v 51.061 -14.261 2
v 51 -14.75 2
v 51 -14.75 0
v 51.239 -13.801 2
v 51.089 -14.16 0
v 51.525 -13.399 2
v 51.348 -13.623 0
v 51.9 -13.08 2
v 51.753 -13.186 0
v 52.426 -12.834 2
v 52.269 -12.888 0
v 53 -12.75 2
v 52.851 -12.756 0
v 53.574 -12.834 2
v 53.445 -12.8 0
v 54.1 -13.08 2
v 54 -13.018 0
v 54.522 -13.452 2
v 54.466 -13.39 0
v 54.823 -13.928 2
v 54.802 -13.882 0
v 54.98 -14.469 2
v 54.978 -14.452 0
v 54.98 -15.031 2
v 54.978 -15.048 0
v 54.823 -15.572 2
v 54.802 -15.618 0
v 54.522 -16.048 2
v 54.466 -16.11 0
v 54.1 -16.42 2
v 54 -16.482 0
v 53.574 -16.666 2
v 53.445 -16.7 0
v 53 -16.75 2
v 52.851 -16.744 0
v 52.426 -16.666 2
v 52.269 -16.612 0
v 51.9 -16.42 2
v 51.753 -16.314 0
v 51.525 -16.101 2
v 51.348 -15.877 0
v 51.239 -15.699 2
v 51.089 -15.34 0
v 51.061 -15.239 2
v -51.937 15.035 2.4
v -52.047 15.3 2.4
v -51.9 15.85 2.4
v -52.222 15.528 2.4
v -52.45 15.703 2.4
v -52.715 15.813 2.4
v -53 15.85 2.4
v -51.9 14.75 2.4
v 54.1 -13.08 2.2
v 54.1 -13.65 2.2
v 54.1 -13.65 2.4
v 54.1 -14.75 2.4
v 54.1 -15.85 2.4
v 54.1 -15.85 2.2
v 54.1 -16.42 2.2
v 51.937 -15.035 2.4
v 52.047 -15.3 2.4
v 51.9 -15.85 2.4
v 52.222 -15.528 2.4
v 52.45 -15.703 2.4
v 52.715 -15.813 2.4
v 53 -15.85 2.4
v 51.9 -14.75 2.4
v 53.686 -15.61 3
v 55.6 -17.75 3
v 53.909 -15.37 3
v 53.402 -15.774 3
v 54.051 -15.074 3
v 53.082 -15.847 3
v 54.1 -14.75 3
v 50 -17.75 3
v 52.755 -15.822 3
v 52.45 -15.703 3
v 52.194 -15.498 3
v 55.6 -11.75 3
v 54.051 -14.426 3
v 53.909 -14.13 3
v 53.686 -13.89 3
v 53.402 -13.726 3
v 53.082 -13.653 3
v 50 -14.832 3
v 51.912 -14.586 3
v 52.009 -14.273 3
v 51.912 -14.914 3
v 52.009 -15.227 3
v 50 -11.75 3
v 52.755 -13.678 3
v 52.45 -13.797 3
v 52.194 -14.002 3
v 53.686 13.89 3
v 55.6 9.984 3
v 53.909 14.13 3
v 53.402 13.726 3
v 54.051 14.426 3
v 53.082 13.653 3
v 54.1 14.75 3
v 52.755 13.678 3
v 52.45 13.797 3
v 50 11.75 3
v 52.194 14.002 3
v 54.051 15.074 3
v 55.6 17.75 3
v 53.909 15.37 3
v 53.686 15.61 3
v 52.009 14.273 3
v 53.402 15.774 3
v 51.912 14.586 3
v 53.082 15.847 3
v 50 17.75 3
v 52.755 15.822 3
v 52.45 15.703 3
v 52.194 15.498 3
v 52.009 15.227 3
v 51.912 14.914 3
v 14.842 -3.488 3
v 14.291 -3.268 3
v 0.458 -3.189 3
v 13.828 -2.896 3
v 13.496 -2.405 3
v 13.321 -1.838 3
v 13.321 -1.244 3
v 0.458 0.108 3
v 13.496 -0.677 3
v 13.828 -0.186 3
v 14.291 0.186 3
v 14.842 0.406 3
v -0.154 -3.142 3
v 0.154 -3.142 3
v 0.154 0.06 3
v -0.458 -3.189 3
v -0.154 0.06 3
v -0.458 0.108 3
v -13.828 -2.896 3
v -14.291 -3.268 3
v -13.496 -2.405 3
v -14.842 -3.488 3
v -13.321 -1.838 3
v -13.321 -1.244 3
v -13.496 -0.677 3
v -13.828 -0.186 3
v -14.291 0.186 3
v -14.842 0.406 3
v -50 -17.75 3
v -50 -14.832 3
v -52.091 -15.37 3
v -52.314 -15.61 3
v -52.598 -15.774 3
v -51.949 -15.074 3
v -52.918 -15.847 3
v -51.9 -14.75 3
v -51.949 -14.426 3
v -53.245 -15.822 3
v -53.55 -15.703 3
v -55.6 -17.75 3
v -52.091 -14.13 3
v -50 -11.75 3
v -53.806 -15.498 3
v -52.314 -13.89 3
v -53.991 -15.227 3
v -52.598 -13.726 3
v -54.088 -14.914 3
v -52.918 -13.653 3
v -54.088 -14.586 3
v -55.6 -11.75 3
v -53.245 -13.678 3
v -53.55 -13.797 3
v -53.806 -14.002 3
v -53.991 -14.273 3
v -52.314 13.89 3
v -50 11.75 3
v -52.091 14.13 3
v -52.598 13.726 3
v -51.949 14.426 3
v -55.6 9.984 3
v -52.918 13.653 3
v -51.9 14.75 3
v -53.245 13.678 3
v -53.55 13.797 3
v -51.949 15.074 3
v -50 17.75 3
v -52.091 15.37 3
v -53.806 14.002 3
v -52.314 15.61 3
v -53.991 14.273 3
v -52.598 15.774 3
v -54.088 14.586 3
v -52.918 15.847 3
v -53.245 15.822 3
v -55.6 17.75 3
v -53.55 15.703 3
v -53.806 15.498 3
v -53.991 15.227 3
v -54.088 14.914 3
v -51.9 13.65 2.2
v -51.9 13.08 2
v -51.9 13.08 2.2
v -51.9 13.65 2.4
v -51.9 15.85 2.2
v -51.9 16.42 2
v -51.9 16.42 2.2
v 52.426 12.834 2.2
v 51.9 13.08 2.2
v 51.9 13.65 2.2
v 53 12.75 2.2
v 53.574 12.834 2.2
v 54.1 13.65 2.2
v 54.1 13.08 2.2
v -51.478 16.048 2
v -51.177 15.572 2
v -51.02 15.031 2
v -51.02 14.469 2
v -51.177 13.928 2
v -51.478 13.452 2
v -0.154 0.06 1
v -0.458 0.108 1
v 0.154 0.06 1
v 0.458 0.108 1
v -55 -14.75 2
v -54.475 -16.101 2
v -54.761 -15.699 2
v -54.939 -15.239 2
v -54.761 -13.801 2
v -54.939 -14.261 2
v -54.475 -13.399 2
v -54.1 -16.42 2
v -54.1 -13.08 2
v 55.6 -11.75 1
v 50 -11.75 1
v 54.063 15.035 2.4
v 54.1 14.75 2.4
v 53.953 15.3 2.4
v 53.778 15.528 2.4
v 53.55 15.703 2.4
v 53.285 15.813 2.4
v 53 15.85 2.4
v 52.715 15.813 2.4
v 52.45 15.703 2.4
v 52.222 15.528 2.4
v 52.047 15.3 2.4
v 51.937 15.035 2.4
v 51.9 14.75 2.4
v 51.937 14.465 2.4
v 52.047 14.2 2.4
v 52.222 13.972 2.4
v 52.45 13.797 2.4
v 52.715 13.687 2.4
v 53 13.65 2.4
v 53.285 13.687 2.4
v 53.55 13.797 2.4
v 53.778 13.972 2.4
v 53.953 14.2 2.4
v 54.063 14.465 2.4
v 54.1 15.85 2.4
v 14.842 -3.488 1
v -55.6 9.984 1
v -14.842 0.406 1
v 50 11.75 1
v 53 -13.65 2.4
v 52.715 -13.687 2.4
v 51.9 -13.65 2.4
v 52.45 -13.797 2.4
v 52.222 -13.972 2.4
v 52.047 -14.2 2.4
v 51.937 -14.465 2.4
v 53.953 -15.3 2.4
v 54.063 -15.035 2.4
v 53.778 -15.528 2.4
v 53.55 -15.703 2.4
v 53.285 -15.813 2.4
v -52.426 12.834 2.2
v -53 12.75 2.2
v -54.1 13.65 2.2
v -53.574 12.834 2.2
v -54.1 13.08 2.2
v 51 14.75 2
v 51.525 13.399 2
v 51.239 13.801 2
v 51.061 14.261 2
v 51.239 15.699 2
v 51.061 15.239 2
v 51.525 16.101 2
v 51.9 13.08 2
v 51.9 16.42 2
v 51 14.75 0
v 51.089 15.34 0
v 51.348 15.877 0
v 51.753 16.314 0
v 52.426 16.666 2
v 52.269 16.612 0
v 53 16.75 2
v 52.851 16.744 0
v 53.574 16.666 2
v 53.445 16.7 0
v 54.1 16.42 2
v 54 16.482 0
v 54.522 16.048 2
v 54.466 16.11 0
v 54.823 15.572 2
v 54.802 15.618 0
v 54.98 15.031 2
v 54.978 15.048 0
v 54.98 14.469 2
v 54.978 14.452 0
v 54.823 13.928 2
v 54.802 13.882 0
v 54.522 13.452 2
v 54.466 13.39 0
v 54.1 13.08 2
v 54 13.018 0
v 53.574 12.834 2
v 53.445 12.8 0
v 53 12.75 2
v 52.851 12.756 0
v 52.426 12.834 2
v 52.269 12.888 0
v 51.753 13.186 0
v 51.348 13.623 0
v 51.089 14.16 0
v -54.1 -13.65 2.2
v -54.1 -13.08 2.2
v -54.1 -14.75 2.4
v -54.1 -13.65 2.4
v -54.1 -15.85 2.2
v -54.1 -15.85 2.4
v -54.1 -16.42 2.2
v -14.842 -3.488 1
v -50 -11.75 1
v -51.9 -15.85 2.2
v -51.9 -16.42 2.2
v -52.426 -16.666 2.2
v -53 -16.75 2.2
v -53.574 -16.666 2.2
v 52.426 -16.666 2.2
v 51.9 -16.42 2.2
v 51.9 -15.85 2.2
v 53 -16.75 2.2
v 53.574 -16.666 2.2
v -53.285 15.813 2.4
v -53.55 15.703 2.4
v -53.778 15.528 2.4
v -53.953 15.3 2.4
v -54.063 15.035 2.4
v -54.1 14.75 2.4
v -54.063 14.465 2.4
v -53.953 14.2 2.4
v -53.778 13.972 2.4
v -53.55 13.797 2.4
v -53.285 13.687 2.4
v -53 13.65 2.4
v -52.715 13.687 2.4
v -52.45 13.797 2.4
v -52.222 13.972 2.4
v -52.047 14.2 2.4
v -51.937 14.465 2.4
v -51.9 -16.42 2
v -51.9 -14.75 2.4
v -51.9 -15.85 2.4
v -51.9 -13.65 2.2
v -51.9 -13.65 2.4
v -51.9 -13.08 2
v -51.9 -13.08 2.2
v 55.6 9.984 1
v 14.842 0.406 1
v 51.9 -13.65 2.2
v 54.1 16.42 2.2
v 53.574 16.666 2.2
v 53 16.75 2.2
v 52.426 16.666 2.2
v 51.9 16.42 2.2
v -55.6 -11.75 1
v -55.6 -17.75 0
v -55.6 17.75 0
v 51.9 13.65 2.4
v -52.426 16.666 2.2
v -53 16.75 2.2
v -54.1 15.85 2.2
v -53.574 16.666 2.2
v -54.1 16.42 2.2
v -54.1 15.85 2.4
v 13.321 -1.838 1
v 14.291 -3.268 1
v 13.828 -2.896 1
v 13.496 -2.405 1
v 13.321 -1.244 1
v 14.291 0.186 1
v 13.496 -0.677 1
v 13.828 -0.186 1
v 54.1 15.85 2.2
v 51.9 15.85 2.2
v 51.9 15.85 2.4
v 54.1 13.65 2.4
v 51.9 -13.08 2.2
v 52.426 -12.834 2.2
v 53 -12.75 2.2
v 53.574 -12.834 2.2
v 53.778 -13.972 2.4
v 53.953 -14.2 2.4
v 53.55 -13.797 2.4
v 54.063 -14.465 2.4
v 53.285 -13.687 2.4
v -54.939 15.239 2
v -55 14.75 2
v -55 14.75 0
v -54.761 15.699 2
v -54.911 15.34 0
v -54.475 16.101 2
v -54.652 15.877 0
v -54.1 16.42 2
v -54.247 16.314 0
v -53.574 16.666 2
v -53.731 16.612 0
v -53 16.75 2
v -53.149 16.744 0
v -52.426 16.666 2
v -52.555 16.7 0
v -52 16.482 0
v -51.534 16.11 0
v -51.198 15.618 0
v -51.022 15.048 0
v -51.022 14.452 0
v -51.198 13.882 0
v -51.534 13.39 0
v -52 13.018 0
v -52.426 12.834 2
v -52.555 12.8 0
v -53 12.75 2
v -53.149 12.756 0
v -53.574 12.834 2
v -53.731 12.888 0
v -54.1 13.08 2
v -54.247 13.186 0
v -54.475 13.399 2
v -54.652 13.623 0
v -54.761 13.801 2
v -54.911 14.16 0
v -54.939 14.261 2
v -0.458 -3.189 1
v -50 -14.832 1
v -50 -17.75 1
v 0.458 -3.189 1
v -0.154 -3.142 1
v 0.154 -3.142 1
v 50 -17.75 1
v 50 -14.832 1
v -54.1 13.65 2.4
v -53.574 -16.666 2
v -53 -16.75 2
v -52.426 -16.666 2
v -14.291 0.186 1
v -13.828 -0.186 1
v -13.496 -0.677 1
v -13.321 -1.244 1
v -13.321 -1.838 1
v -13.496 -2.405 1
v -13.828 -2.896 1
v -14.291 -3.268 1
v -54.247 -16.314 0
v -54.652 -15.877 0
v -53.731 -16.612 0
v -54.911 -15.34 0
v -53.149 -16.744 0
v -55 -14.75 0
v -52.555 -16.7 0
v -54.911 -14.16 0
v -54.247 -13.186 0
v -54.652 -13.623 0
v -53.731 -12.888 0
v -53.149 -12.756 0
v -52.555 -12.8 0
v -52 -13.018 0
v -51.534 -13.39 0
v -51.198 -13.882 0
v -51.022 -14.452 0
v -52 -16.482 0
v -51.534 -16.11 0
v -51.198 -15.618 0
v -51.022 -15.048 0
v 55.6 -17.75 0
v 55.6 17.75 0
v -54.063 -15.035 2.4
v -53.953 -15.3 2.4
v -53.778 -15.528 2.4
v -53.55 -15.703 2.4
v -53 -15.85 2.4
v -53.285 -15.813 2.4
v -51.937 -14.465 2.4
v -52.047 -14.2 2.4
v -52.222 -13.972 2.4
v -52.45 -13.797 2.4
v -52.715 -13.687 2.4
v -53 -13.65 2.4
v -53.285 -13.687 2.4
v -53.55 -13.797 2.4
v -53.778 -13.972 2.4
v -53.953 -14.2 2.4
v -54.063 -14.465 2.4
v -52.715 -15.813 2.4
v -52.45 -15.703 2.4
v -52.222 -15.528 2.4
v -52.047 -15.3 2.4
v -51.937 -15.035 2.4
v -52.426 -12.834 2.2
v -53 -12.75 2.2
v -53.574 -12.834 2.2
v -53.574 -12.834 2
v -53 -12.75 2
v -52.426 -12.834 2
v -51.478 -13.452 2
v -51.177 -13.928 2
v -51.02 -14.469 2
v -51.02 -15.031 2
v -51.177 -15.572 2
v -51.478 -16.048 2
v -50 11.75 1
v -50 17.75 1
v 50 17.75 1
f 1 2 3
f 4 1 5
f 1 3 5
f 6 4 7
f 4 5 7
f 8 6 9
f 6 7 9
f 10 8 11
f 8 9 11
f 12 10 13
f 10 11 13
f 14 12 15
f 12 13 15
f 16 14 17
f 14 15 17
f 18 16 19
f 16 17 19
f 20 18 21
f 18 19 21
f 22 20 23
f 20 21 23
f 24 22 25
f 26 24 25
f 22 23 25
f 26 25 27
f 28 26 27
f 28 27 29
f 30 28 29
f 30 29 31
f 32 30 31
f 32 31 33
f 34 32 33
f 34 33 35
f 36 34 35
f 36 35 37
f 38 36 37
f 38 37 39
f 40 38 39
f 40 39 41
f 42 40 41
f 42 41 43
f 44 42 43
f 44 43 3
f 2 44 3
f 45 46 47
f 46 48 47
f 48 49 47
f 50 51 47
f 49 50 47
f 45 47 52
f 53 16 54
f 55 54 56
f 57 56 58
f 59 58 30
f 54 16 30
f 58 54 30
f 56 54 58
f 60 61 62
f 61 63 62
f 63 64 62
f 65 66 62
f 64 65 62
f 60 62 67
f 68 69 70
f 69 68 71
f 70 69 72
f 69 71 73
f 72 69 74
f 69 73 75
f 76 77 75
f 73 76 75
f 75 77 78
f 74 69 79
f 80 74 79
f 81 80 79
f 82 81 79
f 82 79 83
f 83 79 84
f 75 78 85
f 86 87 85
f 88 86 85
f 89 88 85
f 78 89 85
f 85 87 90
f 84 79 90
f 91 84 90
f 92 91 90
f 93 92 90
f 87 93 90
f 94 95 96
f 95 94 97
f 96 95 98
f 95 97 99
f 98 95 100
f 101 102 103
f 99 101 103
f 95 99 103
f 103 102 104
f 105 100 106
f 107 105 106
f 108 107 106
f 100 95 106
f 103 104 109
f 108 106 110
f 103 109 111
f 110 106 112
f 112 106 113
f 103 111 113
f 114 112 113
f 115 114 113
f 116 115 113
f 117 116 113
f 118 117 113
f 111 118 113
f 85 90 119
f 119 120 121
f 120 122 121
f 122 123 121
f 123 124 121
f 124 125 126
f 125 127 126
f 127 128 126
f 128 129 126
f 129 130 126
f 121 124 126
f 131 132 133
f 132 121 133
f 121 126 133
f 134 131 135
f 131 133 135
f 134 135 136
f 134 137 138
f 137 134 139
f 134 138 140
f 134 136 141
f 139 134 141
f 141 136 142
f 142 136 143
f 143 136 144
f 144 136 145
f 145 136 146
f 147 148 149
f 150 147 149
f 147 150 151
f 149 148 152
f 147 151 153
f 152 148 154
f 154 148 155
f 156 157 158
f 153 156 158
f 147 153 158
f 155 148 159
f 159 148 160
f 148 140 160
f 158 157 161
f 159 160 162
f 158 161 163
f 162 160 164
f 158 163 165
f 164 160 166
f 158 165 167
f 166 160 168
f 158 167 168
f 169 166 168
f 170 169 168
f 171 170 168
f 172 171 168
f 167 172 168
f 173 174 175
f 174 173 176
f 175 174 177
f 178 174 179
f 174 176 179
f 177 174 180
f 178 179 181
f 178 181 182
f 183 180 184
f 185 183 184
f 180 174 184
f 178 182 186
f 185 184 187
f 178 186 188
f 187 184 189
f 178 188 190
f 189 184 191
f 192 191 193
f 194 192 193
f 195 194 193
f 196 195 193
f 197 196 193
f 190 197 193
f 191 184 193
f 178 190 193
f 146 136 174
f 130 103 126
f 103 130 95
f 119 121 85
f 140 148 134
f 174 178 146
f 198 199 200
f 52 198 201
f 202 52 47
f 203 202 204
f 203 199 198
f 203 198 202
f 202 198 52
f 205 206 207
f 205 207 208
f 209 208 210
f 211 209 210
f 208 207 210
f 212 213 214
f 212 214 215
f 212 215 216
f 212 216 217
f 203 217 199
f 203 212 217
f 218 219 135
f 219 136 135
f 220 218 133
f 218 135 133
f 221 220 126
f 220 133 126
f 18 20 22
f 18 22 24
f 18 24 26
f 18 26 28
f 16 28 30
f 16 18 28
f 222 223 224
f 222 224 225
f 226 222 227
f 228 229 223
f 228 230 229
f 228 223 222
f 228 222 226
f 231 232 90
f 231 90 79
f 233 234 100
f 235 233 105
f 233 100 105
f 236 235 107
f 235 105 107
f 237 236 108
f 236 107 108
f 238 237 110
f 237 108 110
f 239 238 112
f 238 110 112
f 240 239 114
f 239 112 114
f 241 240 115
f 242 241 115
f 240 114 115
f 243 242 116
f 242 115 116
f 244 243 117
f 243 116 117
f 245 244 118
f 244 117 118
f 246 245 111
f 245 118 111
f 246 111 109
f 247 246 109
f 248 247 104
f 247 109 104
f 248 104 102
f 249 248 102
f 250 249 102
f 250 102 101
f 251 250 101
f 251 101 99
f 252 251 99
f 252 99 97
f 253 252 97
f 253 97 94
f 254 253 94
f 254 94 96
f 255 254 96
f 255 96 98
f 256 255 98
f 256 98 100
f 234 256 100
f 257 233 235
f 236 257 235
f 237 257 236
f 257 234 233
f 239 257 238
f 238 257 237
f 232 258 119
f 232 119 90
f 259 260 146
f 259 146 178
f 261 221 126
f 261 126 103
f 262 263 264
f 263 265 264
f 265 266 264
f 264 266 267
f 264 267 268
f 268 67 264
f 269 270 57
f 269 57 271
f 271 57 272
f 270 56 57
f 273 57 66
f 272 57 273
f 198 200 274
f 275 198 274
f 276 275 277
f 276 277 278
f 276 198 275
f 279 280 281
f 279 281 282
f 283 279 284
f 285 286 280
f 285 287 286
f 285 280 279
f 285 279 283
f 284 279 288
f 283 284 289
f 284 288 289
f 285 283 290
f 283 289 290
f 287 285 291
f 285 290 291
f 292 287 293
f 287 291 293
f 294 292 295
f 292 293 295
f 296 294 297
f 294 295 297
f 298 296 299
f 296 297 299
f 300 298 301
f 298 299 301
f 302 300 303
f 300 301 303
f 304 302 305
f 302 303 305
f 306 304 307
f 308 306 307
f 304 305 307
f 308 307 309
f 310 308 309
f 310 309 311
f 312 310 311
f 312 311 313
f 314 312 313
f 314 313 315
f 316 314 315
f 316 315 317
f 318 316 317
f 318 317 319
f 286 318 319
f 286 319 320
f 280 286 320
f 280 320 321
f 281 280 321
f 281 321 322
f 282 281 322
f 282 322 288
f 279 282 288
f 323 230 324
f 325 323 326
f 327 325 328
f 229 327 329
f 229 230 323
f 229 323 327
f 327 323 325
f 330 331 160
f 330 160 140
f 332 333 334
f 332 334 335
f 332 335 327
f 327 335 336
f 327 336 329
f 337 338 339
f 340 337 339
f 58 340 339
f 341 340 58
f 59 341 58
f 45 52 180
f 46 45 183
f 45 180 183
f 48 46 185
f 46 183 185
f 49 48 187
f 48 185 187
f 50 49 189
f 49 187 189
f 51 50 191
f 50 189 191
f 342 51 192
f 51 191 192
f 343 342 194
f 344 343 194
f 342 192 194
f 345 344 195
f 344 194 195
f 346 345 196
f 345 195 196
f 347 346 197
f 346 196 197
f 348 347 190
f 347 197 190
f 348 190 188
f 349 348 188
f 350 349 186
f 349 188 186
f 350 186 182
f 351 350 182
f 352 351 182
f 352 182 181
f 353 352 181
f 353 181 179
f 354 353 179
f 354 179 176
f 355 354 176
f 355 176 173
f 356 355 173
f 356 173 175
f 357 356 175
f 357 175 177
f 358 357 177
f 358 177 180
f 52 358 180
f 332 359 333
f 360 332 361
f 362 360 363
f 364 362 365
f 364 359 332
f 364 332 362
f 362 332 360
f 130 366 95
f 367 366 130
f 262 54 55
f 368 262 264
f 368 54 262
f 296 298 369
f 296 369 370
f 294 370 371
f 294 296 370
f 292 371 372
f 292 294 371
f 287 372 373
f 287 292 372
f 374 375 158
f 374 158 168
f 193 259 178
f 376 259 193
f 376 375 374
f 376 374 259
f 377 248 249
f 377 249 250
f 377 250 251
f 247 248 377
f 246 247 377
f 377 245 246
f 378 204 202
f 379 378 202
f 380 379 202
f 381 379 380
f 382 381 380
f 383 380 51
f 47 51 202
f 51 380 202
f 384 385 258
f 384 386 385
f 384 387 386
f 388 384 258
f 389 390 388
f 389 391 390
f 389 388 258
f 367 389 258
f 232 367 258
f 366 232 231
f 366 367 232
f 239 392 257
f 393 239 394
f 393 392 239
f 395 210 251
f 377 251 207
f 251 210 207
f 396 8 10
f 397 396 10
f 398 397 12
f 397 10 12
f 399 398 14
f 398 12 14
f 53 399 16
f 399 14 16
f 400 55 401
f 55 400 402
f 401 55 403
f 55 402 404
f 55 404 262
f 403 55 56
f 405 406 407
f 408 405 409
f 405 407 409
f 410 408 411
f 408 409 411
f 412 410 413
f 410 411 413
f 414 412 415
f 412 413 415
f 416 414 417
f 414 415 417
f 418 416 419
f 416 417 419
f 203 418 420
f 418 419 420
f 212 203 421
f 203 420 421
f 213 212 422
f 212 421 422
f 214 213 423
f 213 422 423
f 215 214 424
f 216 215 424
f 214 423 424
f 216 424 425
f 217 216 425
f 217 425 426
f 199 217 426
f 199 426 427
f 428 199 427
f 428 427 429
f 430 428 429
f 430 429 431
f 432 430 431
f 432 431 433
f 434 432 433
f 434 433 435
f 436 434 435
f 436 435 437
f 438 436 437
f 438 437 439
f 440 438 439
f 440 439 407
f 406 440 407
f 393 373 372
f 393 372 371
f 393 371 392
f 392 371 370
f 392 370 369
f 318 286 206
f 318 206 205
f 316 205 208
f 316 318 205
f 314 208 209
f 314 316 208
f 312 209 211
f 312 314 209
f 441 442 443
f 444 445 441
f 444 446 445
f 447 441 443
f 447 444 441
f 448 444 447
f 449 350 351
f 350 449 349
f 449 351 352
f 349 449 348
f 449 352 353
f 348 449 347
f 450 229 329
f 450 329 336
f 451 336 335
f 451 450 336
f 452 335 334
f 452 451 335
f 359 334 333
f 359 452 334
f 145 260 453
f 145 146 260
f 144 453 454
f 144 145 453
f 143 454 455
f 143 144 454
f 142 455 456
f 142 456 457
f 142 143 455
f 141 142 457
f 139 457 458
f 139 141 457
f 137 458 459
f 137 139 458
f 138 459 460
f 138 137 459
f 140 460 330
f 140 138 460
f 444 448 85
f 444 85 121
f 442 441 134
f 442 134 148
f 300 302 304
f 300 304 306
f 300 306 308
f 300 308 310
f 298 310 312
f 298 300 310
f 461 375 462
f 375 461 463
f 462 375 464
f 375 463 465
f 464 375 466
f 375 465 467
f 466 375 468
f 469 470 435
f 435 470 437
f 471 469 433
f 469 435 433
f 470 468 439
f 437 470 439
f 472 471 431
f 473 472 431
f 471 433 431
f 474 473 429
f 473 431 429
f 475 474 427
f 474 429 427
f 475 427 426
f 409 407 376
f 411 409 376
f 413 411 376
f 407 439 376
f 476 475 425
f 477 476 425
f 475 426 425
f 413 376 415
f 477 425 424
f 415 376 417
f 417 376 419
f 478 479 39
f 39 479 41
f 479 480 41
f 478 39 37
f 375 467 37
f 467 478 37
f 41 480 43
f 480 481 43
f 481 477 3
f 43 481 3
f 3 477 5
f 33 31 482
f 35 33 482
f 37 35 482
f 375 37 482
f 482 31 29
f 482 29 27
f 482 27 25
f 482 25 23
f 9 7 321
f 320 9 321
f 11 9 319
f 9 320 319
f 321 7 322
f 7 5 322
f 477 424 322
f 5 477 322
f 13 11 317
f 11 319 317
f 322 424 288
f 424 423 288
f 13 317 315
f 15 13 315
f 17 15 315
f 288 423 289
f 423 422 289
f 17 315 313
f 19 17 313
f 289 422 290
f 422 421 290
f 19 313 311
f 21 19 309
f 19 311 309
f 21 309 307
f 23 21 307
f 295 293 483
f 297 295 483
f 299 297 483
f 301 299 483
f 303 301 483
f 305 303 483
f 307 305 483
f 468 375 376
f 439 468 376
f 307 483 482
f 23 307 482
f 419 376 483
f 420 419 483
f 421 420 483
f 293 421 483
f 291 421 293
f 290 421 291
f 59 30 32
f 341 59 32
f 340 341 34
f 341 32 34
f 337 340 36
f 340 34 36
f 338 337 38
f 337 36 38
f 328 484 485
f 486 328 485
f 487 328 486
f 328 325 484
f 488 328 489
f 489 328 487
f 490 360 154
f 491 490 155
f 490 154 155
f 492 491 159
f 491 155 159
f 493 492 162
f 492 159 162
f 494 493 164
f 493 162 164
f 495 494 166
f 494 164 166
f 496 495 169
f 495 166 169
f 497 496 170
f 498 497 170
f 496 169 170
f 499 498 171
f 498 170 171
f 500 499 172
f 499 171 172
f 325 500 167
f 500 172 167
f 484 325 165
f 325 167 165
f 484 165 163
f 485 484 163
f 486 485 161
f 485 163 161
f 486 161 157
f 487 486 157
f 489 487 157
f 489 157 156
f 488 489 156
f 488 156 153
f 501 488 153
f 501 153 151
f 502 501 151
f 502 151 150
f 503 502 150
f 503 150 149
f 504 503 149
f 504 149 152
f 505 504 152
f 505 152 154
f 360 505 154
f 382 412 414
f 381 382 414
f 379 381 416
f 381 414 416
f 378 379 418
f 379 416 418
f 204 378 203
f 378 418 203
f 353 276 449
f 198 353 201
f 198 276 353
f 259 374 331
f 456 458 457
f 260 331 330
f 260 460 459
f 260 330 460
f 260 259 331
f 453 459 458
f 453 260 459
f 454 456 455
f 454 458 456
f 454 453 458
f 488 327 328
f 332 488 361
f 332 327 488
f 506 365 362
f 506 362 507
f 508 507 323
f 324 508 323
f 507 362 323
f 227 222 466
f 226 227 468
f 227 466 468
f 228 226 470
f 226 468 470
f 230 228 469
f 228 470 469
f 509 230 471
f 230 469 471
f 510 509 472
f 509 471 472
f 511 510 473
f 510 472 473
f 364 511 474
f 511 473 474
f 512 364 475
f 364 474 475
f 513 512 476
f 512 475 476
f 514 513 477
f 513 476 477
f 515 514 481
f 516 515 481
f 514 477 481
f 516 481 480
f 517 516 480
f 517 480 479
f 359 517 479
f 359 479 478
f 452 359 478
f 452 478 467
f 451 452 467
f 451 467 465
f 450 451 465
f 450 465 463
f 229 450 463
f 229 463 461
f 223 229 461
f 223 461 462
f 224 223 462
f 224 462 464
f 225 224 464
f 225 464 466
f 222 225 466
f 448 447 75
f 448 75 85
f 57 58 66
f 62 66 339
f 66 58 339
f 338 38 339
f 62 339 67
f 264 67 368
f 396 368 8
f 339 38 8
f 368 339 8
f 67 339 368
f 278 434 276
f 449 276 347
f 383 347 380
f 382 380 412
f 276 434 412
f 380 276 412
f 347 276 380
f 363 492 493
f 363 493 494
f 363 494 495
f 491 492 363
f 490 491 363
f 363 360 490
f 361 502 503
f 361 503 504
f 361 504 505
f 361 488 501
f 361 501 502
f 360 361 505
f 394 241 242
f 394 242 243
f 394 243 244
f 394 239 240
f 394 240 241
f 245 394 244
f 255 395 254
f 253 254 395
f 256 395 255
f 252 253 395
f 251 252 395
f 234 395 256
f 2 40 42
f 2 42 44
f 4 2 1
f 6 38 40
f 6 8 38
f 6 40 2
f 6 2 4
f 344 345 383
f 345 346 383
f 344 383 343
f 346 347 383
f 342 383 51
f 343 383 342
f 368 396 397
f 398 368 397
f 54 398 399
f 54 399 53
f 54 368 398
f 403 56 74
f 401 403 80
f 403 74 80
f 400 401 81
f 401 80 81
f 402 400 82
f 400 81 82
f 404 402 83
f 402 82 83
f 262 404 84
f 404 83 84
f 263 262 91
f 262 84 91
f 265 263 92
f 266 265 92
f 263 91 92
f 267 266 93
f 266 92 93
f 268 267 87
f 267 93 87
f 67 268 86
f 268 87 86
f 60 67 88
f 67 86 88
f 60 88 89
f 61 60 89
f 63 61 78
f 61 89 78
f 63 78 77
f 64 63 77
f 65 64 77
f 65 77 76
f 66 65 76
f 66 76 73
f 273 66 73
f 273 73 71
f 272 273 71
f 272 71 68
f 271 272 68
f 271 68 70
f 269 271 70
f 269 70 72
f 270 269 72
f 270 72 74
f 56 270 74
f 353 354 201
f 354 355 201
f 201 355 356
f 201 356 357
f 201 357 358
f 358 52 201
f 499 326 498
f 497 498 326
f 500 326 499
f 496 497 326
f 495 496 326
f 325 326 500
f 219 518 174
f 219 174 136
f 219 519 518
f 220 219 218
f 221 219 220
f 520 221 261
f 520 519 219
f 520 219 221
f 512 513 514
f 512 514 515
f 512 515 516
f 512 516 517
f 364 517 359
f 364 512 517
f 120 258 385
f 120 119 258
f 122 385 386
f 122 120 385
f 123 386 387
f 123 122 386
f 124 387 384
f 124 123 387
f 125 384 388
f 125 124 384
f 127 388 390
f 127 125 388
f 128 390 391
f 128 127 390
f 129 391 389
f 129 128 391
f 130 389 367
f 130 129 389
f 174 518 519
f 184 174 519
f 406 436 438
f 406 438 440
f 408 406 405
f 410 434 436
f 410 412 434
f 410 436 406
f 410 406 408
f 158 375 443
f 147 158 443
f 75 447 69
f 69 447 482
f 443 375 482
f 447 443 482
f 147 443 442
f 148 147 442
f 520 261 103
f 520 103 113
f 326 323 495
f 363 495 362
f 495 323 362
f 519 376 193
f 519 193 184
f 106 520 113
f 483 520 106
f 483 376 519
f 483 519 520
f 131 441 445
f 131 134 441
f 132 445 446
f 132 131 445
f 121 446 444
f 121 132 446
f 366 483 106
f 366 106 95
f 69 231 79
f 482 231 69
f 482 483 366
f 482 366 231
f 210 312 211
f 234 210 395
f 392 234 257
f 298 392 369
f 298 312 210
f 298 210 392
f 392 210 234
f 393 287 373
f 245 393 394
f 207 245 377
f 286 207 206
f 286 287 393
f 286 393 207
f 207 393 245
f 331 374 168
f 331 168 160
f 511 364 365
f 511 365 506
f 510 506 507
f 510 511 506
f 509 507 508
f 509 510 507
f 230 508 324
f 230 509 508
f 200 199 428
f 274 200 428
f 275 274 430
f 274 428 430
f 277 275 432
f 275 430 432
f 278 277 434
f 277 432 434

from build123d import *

# Parameters (mm, degrees)
SKETCH1_W                       = 112
SKETCH1_H                       = 35.5
BOSS_EXTRUDE1_DEPTH             = 1
SKETCH2_W                       = 6
SKETCH2_H                       = 6
BOSS_EXTRUDE2_DEPTH             = 2
SKETCH3_R                       = 1.1
CUT_EXTRUDE1_DEPTH              = 4
SKETCH4_R                       = 2
CUT_EXTRUDE2_DEPTH              = 2
CUT_EXTRUDE3_DEPTH              = 0.2
SKETCH6_W                       = 2.2
SKETCH6_H                       = 2.2
CUT_EXTRUDE4_DEPTH              = 0.2
MIRROR2_COPY_1_DEPTH            = 0.2
MIRROR2_COPY_2_SKETCH_W         = 2.2
MIRROR2_COPY_2_SKETCH_H         = 2.2
MIRROR2_COPY_2_DEPTH            = 0.2
SKETCH7_W                       = 0.4
SKETCH7_H                       = 35.5
CUT_EXTRUDE5_DEPTH              = 4
AUFSATZ_LINEAR_AUSTRAGEN2_DEPTH = 2
VERRUNDUNG1_R                   = 2


with BuildPart() as part:
    # Sketch1 → Boss-Extrude1 (new body)
    with BuildSketch(Plane.XY):
        Rectangle(SKETCH1_W, SKETCH1_H)
    extrude(amount=BOSS_EXTRUDE1_DEPTH)

    # Sketch2 → Boss-Extrude2 (add)
    with BuildSketch(Plane.XY.offset(1)):
        with Locations((-53, 14.75)):
            Rectangle(SKETCH2_W, SKETCH2_H)
        with Locations((-53, -14.75)):
            Rectangle(SKETCH2_W, SKETCH2_H)
        with Locations((53, -14.75)):
            Rectangle(SKETCH2_W, SKETCH2_H)
        with Locations((53, 14.75)):
            Rectangle(SKETCH2_W, SKETCH2_H)
    extrude(amount=BOSS_EXTRUDE2_DEPTH)

    # Sketch3 → Cut-Extrude1 (cut, through all)
    with BuildSketch(Plane.XY.offset(3)):
        with Locations((-53, 14.75)):
            Circle(SKETCH3_R)
        with Locations((-53, -14.75)):
            Circle(SKETCH3_R)
        with Locations((53, -14.75)):
            Circle(SKETCH3_R)
        with Locations((53, 14.75)):
            Circle(SKETCH3_R)
    extrude(amount=-CUT_EXTRUDE1_DEPTH, mode=Mode.SUBTRACT)

    # Sketch4 → Cut-Extrude2 (cut)
    with BuildSketch(Plane(origin=(0, 0, 0), x_dir=(-1, 0, 0), z_dir=(0, 0, -1))):
        with Locations((-53, 14.75)):
            Circle(SKETCH4_R)
        with Locations((-53, -14.75)):
            Circle(SKETCH4_R)
        with Locations((53, 14.75)):
            Circle(SKETCH4_R)
        with Locations((53, -14.75)):
            Circle(SKETCH4_R)
    extrude(amount=-CUT_EXTRUDE2_DEPTH, mode=Mode.SUBTRACT)

    # Sketch5 → Cut-Extrude3 (cut)
    with BuildSketch(Plane(origin=(0, 0, 2), x_dir=(-1, 0, 0), z_dir=(0, 0, -1))):
        with BuildLine():
            Line((-54.1, 13.079670691), (-54.1, 16.420329309))
            ThreePointArc((-54.1, 16.420329309), (-53, 16.75), (-51.9, 16.420329309))
            Line((-51.9, 16.420329309), (-51.9, 13.079670691))
            ThreePointArc((-51.9, 13.079670691), (-53, 12.75), (-54.1, 13.079670691))
        make_face()
    cut_extrude3 = extrude(amount=-CUT_EXTRUDE3_DEPTH, mode=Mode.SUBTRACT)

    # Sketch6 → Cut-Extrude4 (cut)
    with BuildSketch(Plane(origin=(0, 0, 2.2), x_dir=(-1, 0, 0), z_dir=(0, 0, -1))):
        with Locations((-53, 14.75)):
            Rectangle(SKETCH6_W, SKETCH6_H)
    cut_extrude4 = extrude(amount=-CUT_EXTRUDE4_DEPTH, mode=Mode.SUBTRACT)

    # Mirror1: Cut-Extrude3, Cut-Extrude4 across plane
    add(cut_extrude3.mirror(Plane(origin=(0, 0, 0), x_dir=(0, 0, 1), z_dir=(1, 0, 0))), mode=Mode.SUBTRACT)
    add(cut_extrude4.mirror(Plane(origin=(0, 0, 0), x_dir=(0, 0, 1), z_dir=(1, 0, 0))), mode=Mode.SUBTRACT)

    # Mirror2: Cut-Extrude3, Cut-Extrude4 across plane
    add(cut_extrude3.mirror(Plane.ZX), mode=Mode.SUBTRACT)
    add(cut_extrude4.mirror(Plane.ZX), mode=Mode.SUBTRACT)

    # Mirror2 copy 1 sketch → Mirror2 copy 1 (cut)
    with BuildSketch(Plane(origin=(0, 0, 2), x_dir=(1, 0, 0), z_dir=(0, 0, -1))):
        with BuildLine():
            Line((-54.1, 13.079670691), (-54.1, 16.420329309))
            ThreePointArc((-54.1, 16.420329309), (-53, 16.75), (-51.9, 16.420329309))
            Line((-51.9, 16.420329309), (-51.9, 13.079670691))
            ThreePointArc((-51.9, 13.079670691), (-53, 12.75), (-54.1, 13.079670691))
        make_face()
    extrude(amount=-MIRROR2_COPY_1_DEPTH, mode=Mode.SUBTRACT)

    # Mirror2 copy 2 sketch → Mirror2 copy 2 (cut)
    with BuildSketch(Plane(origin=(0, 0, 2.2), x_dir=(1, 0, 0), z_dir=(0, 0, -1))):
        with Locations((-53, 14.75)):
            Rectangle(MIRROR2_COPY_2_SKETCH_W, MIRROR2_COPY_2_SKETCH_H)
    extrude(amount=-MIRROR2_COPY_2_DEPTH, mode=Mode.SUBTRACT)

    # Sketch7 → Cut-Extrude5 (cut, through all)
    with BuildSketch(Plane(origin=(0, 0, 0), x_dir=(-1, 0, 0), z_dir=(0, 0, -1))):
        with Locations((-55.8, 0)):
            Rectangle(SKETCH7_W, SKETCH7_H)
        with Locations((55.8, 0)):
            Rectangle(SKETCH7_W, SKETCH7_H)
    extrude(amount=-CUT_EXTRUDE5_DEPTH, mode=Mode.SUBTRACT)

    # Skizze5 → Aufsatz-Linear austragen2 (add)
    with BuildSketch(Plane.XY.offset(1)):
        Polygon((-50, 11.75), (0, 0), (50, 11.75), (55.6, 11.75), (55.6, 9.984275645), (6.55686033, -1.540862177), (50, -11.75), (50, -14.831724355), (0, -3.081724355), (-50, -14.831724355), (-50, -11.75), (-6.55686033, -1.540862177), (-55.6, 9.984275645), (-55.6, 11.75), align=None)
    extrude(amount=AUFSATZ_LINEAR_AUSTRAGEN2_DEPTH)

    # Verrundung1
    verrundung1_edges = [part.edges().sort_by_distance(p)[0] for p in [
        (-6.55686033, -1.540862177, 2),
        (0, -3.081724355, 2),
        (6.55686033, -1.540862177, 2),
        (0, 0, 2),
    ]]
    fillet(verrundung1_edges, radius=VERRUNDUNG1_R)


solid = part.part
